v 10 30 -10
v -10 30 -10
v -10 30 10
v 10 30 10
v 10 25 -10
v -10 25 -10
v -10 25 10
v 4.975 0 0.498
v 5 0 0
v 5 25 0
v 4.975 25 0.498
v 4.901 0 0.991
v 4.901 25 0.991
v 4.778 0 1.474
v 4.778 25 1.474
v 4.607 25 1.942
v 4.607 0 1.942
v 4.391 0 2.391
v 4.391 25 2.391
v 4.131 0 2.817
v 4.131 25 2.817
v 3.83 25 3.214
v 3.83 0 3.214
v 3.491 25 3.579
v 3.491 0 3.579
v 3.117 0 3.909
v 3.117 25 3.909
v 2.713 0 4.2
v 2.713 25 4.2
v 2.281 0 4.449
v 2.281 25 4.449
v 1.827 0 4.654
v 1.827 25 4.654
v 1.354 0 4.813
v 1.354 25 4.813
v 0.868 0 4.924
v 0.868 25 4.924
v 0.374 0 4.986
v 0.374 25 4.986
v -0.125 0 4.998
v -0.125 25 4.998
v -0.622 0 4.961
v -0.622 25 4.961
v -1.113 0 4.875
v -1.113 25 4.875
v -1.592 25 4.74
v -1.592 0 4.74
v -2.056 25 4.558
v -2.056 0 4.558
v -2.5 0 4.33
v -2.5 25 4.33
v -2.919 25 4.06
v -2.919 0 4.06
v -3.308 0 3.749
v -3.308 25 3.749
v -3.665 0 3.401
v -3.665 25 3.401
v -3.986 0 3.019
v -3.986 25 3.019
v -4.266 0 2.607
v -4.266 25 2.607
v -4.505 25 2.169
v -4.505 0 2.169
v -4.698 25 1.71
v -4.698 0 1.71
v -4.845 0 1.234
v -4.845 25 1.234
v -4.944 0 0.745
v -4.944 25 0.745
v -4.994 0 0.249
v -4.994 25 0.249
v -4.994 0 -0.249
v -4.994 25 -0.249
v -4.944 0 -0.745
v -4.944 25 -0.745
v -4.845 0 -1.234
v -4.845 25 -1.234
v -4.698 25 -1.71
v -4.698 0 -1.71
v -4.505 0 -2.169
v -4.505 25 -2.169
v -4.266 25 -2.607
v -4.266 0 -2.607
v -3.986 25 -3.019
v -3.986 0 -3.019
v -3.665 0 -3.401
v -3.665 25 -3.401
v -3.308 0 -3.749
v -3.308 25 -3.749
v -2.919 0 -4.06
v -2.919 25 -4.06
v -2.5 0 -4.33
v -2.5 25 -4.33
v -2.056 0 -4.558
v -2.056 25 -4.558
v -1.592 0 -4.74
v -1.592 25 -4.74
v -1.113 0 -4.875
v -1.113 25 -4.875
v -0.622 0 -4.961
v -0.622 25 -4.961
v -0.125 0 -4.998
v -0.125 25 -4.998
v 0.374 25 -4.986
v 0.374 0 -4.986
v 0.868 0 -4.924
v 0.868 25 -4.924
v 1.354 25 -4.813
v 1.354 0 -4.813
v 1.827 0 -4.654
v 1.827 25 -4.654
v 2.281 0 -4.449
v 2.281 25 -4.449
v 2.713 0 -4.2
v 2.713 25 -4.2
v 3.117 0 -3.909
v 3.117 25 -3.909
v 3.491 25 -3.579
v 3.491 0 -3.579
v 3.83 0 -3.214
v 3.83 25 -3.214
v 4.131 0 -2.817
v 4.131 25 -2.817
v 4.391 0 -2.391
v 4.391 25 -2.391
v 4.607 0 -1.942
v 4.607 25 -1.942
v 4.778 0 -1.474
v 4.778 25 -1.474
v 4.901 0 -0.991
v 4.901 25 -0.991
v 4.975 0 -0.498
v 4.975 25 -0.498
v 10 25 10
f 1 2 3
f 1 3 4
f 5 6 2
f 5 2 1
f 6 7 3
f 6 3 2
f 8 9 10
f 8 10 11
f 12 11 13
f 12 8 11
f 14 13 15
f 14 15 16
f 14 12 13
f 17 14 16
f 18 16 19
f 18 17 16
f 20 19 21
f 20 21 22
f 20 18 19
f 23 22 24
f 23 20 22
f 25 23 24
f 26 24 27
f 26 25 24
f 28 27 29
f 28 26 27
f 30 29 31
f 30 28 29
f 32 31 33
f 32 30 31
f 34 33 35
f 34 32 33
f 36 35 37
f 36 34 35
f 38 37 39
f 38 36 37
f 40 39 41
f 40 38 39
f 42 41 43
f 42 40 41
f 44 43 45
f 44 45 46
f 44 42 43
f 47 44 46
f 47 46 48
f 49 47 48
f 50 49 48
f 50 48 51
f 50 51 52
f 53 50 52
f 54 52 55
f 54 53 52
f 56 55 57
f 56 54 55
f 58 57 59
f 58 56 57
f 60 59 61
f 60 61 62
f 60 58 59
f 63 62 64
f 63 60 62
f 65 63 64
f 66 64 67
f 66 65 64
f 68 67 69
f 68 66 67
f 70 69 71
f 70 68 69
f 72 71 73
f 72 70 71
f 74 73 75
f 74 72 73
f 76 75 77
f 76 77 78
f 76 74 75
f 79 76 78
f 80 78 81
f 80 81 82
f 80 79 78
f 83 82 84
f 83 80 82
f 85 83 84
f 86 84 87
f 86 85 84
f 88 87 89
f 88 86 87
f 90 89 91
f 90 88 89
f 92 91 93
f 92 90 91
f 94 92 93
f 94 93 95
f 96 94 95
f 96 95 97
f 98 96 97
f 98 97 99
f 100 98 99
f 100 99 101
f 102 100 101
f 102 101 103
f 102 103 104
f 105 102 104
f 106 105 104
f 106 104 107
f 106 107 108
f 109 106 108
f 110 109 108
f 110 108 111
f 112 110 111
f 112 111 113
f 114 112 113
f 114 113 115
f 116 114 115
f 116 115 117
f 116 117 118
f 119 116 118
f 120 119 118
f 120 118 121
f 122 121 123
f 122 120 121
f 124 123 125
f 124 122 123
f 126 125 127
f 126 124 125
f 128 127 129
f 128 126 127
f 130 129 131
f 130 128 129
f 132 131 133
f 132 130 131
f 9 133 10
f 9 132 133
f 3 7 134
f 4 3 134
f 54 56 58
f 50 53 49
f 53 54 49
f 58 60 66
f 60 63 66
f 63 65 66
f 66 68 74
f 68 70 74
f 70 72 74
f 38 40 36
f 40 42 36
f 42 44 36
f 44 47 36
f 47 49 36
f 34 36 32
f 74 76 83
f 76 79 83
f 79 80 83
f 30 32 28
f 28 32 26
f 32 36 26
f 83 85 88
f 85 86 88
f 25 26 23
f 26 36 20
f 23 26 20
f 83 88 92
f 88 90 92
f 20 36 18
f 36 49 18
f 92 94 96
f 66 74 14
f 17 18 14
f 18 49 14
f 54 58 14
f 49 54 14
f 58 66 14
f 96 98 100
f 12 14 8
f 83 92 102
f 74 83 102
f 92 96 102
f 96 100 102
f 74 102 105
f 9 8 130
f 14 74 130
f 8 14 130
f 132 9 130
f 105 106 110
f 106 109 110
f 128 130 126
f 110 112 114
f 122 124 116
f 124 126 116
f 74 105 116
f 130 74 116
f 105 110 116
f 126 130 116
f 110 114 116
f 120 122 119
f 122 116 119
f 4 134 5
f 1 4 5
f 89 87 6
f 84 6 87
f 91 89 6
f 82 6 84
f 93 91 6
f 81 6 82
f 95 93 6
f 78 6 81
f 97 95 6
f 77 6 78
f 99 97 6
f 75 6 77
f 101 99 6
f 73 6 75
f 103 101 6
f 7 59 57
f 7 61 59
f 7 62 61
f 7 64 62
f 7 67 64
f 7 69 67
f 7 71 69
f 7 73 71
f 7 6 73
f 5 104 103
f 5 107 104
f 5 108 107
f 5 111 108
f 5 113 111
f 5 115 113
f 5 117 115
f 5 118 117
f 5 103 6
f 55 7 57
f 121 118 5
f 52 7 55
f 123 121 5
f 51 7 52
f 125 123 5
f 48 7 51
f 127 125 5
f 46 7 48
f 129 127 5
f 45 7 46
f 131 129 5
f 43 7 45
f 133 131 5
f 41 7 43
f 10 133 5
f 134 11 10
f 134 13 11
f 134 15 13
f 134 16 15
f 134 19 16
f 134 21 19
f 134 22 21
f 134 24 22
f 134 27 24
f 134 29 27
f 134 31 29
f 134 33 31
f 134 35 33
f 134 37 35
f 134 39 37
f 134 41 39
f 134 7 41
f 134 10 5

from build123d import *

# Parameters (mm, degrees)
SKETCH_1_W          = 20
SKETCH_1_H          = 20
EXTRUDE_1_DEPTH     = 30
SKETCH_3_W          = 20
SKETCH_3_H          = 20
SKETCH_3_R          = 5
CUT_EXTRUDE_1_DEPTH = 25


with BuildPart() as part:
    # Эскиз1 → Бобышка-Вытянуть1 (new body)
    with BuildSketch(Plane(origin=(0, 0, 0), x_dir=(1, 0, 0), z_dir=(0, 1, 0))):
        Rectangle(SKETCH_1_W, SKETCH_1_H)
    extrude(amount=EXTRUDE_1_DEPTH)

    # Эскиз3 → Вырез-Вытянуть1 (cut)
    with BuildSketch(Plane.XZ):
        Rectangle(SKETCH_3_W, SKETCH_3_H)
        Circle(SKETCH_3_R, mode=Mode.SUBTRACT)
    extrude(amount=-CUT_EXTRUDE_1_DEPTH, mode=Mode.SUBTRACT)


solid = part.part
